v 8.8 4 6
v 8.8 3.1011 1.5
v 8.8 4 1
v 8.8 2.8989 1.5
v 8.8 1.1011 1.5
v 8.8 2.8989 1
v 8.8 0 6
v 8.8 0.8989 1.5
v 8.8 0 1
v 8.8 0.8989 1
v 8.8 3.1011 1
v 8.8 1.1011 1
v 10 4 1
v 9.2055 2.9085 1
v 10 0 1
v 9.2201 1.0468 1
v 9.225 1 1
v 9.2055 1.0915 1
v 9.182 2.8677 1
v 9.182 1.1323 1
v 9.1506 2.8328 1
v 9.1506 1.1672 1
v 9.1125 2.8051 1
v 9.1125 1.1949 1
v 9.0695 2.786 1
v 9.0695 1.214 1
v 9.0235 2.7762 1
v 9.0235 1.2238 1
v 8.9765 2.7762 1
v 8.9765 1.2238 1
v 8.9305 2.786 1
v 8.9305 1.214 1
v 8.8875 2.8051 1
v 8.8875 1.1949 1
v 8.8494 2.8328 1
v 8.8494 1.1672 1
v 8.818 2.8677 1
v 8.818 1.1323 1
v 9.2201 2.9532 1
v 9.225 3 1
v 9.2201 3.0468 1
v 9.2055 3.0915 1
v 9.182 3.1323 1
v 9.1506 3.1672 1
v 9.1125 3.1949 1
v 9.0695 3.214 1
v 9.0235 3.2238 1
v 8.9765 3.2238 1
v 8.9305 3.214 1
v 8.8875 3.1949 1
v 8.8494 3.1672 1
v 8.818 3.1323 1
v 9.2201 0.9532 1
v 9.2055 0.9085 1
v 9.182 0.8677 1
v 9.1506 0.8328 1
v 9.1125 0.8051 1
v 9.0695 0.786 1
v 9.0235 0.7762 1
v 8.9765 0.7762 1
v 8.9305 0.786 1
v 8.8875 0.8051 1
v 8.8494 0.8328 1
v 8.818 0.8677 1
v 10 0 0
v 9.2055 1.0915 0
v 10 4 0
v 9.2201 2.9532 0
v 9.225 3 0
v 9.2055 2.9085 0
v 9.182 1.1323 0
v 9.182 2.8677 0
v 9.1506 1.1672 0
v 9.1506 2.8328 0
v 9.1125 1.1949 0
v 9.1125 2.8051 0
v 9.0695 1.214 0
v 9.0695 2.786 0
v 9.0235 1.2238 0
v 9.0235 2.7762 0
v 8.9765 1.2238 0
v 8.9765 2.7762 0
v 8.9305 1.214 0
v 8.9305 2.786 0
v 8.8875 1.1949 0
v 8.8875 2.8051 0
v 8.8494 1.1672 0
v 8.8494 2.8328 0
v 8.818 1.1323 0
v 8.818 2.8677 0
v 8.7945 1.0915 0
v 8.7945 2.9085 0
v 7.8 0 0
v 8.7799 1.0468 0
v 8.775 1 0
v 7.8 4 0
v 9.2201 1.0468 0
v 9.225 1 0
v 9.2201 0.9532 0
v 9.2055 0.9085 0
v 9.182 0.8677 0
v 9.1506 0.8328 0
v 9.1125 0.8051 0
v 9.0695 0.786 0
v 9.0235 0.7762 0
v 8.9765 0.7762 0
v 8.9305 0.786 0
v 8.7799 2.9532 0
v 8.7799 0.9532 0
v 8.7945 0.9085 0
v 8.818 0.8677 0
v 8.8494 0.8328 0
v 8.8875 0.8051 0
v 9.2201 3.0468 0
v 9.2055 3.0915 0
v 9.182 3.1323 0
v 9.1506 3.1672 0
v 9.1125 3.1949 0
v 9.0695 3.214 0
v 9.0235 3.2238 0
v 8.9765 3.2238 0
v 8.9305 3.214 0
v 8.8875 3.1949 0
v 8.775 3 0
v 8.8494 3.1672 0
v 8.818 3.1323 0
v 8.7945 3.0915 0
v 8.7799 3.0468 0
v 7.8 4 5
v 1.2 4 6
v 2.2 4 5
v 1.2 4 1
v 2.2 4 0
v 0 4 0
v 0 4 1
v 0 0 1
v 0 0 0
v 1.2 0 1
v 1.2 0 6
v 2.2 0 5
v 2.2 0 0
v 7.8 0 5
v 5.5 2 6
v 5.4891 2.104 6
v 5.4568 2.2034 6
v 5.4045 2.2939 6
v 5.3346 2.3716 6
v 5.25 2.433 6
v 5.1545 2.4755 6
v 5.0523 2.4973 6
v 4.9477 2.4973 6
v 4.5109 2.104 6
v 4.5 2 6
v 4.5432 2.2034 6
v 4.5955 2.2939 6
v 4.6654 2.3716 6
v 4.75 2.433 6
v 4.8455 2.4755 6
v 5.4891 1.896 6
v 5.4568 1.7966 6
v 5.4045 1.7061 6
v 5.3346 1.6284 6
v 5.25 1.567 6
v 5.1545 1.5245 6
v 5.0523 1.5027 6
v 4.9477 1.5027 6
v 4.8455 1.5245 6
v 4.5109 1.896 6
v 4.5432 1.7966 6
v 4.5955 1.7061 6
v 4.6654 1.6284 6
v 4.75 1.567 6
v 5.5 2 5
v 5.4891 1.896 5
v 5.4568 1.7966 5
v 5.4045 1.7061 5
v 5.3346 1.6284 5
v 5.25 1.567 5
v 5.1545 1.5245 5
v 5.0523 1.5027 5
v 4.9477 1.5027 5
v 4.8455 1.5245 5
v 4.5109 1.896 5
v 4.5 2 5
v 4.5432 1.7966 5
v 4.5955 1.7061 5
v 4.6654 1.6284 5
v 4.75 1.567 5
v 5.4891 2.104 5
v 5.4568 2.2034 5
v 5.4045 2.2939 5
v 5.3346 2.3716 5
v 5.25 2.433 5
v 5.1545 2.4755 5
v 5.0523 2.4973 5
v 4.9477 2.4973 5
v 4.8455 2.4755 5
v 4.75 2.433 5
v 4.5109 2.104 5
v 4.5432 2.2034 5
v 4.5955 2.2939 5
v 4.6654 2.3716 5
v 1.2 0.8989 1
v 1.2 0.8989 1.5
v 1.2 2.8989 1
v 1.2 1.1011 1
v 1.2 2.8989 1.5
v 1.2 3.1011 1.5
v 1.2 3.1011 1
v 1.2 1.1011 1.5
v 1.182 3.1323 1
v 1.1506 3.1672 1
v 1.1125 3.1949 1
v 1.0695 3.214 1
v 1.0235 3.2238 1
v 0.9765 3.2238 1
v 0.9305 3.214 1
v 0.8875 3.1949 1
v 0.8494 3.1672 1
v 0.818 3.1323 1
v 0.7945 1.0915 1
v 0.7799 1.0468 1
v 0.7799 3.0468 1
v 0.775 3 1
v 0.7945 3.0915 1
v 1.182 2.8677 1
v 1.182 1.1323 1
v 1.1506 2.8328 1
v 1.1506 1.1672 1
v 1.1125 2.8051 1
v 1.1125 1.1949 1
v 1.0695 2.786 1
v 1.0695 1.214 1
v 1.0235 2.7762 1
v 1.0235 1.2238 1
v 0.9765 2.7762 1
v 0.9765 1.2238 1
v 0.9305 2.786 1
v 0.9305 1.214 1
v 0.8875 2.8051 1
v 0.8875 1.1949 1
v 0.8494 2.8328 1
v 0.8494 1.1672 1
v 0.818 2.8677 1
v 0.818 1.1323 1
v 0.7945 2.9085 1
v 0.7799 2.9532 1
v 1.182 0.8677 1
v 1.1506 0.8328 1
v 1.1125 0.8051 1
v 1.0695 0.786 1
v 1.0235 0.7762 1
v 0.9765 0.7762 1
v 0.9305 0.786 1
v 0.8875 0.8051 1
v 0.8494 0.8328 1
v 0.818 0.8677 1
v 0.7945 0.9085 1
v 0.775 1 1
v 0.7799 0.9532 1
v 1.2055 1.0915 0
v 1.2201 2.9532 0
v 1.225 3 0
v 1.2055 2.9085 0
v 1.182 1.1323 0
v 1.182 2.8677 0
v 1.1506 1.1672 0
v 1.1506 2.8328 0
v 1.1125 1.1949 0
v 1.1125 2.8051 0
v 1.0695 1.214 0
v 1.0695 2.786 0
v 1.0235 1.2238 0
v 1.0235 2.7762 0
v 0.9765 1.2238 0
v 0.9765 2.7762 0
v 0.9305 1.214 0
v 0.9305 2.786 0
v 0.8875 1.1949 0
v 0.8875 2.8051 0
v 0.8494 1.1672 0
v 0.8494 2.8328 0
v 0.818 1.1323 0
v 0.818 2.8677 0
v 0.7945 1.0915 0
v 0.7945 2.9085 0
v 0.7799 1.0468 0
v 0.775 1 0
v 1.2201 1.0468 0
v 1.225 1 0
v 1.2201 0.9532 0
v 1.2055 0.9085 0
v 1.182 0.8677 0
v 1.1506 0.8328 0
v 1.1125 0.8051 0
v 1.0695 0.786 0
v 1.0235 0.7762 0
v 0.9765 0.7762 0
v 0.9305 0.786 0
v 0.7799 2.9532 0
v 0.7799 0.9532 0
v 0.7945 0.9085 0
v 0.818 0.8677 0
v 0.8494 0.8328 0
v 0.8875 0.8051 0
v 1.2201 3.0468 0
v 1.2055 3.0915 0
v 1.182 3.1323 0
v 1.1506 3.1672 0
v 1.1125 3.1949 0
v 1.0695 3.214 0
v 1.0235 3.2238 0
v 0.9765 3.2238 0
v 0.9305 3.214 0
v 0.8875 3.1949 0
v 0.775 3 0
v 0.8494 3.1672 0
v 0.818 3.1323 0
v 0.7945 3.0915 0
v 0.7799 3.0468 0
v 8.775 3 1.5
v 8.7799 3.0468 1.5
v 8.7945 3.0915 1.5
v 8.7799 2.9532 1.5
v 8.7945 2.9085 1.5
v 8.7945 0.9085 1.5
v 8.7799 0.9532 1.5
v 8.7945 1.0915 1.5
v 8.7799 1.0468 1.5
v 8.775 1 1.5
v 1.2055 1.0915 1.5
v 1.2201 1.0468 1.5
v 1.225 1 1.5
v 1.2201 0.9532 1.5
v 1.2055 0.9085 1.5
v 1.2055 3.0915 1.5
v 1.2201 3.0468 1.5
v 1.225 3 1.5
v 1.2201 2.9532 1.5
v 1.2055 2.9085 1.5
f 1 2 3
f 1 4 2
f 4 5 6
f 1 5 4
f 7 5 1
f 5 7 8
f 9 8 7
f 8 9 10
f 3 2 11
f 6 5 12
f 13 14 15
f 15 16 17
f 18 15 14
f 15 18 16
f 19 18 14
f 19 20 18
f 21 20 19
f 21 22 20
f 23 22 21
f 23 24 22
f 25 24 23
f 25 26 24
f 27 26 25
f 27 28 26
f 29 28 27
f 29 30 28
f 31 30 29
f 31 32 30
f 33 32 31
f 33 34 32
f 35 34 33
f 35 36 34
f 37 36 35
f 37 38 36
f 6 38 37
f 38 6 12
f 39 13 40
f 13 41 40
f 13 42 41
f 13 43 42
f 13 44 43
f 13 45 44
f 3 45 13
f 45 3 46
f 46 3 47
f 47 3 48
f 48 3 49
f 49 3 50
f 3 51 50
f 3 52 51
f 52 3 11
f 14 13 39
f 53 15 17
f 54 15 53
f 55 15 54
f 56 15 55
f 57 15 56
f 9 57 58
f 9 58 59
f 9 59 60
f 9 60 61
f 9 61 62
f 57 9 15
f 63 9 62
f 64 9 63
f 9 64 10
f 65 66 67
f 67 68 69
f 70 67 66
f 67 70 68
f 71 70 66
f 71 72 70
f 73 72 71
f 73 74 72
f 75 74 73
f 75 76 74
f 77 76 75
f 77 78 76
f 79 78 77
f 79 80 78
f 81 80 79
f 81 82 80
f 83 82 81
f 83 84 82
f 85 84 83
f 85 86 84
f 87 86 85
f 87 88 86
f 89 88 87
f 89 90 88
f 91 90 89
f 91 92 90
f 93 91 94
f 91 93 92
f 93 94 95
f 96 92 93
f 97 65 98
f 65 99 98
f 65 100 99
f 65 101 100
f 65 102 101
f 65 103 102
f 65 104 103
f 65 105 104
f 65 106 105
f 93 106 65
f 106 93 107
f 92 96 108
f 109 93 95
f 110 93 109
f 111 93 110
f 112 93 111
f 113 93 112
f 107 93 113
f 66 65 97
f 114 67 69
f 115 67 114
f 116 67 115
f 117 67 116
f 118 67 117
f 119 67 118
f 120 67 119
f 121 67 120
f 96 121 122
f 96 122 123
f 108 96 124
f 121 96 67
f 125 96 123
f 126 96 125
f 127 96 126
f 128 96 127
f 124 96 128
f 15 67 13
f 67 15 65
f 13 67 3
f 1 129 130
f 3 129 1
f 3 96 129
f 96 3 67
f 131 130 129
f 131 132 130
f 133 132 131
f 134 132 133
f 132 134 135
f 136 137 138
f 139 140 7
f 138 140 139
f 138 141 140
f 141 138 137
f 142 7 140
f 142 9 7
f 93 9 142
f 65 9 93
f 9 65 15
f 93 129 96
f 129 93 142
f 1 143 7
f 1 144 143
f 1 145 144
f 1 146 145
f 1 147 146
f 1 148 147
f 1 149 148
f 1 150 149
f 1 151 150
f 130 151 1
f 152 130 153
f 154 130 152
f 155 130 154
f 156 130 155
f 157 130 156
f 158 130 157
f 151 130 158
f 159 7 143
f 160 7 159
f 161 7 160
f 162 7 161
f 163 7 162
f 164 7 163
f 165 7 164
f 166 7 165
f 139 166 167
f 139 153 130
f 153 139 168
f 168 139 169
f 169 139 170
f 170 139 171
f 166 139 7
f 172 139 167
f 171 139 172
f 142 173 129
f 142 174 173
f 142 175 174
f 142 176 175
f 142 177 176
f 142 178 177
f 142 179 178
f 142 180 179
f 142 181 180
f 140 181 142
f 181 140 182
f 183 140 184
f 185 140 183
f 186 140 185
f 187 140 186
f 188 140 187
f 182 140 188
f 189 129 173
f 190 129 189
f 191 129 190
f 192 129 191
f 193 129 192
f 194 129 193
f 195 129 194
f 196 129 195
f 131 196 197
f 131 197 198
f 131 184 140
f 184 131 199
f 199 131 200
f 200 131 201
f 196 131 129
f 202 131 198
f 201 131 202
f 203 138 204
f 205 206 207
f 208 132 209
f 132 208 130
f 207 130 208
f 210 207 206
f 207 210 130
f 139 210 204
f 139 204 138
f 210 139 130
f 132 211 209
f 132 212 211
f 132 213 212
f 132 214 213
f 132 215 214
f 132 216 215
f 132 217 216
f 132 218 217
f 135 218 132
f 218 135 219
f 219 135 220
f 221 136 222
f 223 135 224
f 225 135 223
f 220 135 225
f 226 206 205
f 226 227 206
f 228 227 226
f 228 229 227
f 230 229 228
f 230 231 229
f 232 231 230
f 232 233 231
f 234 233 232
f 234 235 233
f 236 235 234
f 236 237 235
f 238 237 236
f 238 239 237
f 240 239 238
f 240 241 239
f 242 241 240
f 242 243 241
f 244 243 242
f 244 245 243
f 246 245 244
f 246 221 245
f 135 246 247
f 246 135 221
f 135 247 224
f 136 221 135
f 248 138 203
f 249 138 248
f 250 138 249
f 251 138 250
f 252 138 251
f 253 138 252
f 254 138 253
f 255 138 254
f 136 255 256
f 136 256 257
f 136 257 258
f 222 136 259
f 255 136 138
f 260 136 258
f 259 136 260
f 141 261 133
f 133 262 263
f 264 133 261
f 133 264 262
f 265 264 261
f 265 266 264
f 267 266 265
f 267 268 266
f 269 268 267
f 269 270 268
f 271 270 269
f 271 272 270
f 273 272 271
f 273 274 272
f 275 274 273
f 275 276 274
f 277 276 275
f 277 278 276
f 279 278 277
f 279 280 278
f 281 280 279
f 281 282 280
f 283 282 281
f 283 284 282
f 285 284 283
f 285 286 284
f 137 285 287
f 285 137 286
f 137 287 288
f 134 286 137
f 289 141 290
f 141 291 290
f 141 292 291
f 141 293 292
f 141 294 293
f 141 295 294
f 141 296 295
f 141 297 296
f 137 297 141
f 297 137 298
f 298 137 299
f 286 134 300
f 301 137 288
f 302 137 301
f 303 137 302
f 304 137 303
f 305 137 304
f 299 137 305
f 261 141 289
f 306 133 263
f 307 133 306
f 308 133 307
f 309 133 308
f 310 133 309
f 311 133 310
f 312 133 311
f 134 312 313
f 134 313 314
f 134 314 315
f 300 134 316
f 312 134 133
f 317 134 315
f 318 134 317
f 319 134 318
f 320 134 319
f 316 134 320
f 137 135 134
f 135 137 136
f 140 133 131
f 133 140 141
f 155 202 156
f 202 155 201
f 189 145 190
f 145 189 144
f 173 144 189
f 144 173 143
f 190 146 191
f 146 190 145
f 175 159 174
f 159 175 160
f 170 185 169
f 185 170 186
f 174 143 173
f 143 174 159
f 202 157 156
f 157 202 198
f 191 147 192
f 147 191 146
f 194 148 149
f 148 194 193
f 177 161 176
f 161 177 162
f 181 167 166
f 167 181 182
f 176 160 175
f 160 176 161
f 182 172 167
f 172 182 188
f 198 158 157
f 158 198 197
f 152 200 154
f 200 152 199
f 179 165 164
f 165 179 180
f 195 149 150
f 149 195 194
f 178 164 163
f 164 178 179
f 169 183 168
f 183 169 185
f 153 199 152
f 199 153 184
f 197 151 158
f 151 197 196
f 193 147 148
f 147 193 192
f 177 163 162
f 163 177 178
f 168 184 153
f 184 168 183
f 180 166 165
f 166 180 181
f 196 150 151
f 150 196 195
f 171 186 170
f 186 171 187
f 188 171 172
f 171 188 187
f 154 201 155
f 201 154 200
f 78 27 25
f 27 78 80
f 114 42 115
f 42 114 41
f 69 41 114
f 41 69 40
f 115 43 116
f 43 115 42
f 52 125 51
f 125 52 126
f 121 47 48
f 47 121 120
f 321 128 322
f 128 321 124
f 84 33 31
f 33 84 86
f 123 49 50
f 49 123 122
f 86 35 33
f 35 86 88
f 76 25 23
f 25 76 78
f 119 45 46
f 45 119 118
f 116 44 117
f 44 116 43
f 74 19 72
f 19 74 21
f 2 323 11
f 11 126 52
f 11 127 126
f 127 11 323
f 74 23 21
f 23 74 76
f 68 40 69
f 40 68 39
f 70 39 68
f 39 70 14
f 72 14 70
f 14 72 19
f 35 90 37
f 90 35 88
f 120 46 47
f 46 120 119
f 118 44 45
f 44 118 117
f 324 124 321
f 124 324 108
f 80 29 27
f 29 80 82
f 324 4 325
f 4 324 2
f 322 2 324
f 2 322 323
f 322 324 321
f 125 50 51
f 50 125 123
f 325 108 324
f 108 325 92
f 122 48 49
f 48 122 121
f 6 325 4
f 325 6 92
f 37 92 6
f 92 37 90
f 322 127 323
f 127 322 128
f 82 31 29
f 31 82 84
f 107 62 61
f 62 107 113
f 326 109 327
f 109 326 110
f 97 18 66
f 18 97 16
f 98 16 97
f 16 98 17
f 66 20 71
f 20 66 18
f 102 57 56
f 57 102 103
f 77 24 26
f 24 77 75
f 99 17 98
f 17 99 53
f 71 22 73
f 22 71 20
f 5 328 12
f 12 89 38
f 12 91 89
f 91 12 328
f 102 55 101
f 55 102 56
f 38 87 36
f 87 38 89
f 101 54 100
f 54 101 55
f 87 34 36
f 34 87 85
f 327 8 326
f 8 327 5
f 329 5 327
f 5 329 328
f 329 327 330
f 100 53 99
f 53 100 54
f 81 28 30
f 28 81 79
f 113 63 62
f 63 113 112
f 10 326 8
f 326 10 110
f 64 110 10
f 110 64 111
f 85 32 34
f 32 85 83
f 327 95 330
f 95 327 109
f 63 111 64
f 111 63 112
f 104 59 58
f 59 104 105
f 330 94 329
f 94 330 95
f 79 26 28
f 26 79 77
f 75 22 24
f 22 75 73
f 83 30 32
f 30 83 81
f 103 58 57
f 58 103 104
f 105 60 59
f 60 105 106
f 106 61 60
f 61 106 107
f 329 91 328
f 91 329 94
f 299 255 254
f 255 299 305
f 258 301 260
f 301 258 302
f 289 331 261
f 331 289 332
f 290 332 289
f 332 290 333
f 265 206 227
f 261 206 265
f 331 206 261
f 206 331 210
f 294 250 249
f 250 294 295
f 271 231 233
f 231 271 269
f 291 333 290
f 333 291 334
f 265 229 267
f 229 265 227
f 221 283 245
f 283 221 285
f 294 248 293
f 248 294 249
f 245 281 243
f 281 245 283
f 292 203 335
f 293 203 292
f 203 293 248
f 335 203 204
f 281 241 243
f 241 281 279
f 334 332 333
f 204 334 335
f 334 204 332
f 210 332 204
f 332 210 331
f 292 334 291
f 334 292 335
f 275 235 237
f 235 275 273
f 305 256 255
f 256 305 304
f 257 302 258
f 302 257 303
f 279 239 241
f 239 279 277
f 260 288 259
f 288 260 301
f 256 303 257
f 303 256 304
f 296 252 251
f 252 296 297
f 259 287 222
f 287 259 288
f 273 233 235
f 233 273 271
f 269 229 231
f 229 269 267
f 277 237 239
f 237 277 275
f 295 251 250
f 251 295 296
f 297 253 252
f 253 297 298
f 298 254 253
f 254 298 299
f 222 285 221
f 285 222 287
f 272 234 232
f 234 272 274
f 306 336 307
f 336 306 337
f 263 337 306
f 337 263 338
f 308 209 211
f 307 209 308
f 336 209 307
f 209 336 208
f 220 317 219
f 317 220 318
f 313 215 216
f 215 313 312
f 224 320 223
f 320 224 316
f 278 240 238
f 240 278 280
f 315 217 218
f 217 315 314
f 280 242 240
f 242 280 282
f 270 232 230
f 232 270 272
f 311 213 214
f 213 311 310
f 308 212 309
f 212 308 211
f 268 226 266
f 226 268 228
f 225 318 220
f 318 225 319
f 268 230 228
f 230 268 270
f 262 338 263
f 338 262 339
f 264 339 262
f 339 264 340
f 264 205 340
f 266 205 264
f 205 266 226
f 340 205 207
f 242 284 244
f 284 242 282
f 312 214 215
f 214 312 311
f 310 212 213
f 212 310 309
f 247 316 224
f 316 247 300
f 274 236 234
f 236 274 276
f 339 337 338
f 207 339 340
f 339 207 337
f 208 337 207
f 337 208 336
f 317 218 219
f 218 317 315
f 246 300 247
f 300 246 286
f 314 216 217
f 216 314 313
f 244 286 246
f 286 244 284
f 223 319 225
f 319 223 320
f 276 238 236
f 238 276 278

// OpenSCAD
$fn = 30;
inner_top = 5.6;
wing_depth = 4;
wing_width = 10;


difference() {
	union() {
		cube([1.2,wing_depth,1]);
		color([1,0,0]) translate([1.2,0,0]) cube([1,wing_depth,6]);
		translate([2.2,0,5]) cube([inner_top/2,wing_depth,1]);
		translate([wing_depth + 0.4 + inner_top, 0, 0]) mirror([-1,0,0]) {
			cube([1.2,wing_depth,1]);
			color([1,0,0]) translate([1.2,0,0]) cube([1,wing_depth,6]);
			translate([2.2,0,5]) cube([inner_top/2,wing_depth,1]);
		}
	}
	translate([wing_width/2, wing_depth/2, 0]) {
		cylinder(d=1, h=20, center=true);
		translate([wing_width/2-1, 1, 0]) cylinder(d=0.45, h=3, center=true);
		translate([wing_width/2-1, -1, 0]) cylinder(d=0.45, h=3, center=true);
		translate([-wing_width/2+1, -1, 0]) cylinder(d=0.45, h=3, center=true);
		translate([-wing_width/2+1, 1, 0]) cylinder(d=0.45, h=3, center=true);
	}
}
